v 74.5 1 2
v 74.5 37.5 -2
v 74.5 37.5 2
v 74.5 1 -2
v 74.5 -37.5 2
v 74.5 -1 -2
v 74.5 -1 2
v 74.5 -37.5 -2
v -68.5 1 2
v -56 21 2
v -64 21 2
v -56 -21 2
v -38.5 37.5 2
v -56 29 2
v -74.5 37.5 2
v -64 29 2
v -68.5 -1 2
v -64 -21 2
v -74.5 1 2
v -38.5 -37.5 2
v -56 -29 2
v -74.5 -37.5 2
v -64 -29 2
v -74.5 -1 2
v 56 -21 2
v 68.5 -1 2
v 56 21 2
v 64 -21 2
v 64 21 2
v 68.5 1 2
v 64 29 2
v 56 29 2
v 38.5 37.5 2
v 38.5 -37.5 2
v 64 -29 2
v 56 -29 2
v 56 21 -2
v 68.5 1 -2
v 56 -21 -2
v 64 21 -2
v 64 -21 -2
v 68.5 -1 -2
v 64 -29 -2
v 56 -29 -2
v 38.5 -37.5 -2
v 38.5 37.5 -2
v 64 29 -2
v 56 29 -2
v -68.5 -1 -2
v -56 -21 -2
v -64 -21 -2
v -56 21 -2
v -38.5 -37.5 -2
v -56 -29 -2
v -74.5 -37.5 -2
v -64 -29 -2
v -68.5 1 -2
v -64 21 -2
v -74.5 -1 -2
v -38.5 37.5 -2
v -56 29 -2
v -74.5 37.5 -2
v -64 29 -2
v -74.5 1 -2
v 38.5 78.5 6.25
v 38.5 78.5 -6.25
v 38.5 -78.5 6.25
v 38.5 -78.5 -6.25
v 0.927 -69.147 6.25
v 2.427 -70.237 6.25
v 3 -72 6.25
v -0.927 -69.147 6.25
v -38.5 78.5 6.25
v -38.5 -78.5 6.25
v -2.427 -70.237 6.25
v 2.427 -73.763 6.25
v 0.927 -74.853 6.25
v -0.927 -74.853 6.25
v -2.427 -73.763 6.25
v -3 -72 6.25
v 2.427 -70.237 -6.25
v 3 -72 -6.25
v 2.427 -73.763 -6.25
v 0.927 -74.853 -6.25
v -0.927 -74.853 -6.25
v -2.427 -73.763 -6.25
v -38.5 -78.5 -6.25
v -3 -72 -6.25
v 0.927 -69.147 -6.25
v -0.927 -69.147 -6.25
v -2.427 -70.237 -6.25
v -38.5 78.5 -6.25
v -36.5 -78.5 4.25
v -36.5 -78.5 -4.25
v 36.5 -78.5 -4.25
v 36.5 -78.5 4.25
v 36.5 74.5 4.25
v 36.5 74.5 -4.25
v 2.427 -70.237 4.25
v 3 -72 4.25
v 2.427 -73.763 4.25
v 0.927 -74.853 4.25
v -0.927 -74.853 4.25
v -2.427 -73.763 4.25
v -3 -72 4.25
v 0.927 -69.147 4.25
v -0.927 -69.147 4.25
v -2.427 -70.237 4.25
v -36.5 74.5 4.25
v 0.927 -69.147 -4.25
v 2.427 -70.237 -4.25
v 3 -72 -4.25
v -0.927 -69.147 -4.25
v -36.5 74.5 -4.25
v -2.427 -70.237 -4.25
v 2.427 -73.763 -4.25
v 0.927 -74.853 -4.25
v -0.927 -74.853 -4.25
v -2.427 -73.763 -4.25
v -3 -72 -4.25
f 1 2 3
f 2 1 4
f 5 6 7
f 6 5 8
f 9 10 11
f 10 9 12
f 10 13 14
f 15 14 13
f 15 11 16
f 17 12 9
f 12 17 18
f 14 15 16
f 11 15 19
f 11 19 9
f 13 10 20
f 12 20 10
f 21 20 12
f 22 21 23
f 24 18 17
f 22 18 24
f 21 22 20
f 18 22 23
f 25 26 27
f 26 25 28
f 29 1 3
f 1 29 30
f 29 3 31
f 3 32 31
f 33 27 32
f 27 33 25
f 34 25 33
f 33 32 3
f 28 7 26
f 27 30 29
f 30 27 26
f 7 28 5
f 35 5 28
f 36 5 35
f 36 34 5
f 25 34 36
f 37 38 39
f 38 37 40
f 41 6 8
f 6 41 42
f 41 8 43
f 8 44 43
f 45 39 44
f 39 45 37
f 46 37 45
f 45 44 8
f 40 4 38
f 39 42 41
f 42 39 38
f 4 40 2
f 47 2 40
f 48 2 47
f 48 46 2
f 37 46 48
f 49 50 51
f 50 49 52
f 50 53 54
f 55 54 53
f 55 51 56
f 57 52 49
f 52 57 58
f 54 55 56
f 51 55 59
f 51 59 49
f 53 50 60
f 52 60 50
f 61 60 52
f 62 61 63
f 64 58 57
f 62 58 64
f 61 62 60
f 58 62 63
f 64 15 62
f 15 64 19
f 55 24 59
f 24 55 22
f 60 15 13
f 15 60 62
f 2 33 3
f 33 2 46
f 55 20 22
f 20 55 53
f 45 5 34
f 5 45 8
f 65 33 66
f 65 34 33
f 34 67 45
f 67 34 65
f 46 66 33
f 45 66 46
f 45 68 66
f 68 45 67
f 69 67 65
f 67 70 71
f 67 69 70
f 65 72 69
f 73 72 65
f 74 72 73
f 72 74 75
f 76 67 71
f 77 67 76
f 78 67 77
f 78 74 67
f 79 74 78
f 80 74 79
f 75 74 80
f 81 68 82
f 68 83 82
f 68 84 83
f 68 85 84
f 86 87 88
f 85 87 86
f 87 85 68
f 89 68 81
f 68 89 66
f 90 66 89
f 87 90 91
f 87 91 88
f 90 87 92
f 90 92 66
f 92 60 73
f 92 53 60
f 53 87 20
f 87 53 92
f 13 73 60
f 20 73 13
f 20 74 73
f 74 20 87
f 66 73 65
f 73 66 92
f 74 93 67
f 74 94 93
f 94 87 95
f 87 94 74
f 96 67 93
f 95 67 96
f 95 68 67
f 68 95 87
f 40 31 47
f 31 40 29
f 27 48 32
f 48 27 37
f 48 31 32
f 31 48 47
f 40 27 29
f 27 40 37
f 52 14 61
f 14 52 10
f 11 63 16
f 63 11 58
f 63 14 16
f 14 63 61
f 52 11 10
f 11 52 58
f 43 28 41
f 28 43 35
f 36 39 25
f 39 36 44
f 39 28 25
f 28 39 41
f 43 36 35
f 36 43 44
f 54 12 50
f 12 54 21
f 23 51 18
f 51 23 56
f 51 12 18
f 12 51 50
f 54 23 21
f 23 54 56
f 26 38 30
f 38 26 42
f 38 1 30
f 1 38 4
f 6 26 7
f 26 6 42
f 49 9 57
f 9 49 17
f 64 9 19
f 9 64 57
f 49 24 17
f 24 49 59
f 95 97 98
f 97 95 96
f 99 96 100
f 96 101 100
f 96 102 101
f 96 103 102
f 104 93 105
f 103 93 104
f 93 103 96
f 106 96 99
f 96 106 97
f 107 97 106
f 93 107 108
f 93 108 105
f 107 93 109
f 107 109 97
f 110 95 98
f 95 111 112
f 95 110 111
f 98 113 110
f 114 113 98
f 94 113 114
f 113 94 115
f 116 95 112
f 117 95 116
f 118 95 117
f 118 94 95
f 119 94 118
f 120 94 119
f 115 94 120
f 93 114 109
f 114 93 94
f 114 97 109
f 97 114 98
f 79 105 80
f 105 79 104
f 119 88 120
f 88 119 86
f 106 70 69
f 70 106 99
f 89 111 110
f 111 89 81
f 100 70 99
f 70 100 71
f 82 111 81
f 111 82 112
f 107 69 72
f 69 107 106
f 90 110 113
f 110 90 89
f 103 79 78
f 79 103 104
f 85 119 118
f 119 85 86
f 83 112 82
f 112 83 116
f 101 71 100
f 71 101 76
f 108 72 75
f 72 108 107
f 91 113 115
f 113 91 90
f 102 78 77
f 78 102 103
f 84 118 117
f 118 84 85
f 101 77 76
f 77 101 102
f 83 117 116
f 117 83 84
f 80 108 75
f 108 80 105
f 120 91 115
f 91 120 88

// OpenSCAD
Phone_Width=73;
Phone_Length=153;
Phone_Height=8.5;
Side_Holes=8;
Front_Hole=6;

difference(){
    union(){
        translate([0,0,0])
        cube([149,75,4],center=true);
        translate([0,0,0])
        cube([Phone_Width+4,Phone_Length+4,Phone_Height+4],center=true);
    }
    union(){
      translate([60,25,0])  
      cube(Side_Holes, center=true);
      translate([-60,25,0])
      cube(Side_Holes, center=true);  
      translate([60,-25,0])
      cube(Side_Holes, center=true);  
      translate([-60,-25,0])
      cube(Side_Holes, center=true);  
        
      translate([143/2,0,0])  
      cube([6,2,100], center=true); 
      translate([-143/2,0,0])  
      cube([6,2,100], center=true); 
      
      translate([0,-2,0])
      cube([Phone_Width,Phone_Length,Phone_Height], center=true); 
        translate([0,-72,0])
      cylinder(Phone_Height+4,Front_Hole/2,Front_Hole/2, center=true); 
        
        }
}
